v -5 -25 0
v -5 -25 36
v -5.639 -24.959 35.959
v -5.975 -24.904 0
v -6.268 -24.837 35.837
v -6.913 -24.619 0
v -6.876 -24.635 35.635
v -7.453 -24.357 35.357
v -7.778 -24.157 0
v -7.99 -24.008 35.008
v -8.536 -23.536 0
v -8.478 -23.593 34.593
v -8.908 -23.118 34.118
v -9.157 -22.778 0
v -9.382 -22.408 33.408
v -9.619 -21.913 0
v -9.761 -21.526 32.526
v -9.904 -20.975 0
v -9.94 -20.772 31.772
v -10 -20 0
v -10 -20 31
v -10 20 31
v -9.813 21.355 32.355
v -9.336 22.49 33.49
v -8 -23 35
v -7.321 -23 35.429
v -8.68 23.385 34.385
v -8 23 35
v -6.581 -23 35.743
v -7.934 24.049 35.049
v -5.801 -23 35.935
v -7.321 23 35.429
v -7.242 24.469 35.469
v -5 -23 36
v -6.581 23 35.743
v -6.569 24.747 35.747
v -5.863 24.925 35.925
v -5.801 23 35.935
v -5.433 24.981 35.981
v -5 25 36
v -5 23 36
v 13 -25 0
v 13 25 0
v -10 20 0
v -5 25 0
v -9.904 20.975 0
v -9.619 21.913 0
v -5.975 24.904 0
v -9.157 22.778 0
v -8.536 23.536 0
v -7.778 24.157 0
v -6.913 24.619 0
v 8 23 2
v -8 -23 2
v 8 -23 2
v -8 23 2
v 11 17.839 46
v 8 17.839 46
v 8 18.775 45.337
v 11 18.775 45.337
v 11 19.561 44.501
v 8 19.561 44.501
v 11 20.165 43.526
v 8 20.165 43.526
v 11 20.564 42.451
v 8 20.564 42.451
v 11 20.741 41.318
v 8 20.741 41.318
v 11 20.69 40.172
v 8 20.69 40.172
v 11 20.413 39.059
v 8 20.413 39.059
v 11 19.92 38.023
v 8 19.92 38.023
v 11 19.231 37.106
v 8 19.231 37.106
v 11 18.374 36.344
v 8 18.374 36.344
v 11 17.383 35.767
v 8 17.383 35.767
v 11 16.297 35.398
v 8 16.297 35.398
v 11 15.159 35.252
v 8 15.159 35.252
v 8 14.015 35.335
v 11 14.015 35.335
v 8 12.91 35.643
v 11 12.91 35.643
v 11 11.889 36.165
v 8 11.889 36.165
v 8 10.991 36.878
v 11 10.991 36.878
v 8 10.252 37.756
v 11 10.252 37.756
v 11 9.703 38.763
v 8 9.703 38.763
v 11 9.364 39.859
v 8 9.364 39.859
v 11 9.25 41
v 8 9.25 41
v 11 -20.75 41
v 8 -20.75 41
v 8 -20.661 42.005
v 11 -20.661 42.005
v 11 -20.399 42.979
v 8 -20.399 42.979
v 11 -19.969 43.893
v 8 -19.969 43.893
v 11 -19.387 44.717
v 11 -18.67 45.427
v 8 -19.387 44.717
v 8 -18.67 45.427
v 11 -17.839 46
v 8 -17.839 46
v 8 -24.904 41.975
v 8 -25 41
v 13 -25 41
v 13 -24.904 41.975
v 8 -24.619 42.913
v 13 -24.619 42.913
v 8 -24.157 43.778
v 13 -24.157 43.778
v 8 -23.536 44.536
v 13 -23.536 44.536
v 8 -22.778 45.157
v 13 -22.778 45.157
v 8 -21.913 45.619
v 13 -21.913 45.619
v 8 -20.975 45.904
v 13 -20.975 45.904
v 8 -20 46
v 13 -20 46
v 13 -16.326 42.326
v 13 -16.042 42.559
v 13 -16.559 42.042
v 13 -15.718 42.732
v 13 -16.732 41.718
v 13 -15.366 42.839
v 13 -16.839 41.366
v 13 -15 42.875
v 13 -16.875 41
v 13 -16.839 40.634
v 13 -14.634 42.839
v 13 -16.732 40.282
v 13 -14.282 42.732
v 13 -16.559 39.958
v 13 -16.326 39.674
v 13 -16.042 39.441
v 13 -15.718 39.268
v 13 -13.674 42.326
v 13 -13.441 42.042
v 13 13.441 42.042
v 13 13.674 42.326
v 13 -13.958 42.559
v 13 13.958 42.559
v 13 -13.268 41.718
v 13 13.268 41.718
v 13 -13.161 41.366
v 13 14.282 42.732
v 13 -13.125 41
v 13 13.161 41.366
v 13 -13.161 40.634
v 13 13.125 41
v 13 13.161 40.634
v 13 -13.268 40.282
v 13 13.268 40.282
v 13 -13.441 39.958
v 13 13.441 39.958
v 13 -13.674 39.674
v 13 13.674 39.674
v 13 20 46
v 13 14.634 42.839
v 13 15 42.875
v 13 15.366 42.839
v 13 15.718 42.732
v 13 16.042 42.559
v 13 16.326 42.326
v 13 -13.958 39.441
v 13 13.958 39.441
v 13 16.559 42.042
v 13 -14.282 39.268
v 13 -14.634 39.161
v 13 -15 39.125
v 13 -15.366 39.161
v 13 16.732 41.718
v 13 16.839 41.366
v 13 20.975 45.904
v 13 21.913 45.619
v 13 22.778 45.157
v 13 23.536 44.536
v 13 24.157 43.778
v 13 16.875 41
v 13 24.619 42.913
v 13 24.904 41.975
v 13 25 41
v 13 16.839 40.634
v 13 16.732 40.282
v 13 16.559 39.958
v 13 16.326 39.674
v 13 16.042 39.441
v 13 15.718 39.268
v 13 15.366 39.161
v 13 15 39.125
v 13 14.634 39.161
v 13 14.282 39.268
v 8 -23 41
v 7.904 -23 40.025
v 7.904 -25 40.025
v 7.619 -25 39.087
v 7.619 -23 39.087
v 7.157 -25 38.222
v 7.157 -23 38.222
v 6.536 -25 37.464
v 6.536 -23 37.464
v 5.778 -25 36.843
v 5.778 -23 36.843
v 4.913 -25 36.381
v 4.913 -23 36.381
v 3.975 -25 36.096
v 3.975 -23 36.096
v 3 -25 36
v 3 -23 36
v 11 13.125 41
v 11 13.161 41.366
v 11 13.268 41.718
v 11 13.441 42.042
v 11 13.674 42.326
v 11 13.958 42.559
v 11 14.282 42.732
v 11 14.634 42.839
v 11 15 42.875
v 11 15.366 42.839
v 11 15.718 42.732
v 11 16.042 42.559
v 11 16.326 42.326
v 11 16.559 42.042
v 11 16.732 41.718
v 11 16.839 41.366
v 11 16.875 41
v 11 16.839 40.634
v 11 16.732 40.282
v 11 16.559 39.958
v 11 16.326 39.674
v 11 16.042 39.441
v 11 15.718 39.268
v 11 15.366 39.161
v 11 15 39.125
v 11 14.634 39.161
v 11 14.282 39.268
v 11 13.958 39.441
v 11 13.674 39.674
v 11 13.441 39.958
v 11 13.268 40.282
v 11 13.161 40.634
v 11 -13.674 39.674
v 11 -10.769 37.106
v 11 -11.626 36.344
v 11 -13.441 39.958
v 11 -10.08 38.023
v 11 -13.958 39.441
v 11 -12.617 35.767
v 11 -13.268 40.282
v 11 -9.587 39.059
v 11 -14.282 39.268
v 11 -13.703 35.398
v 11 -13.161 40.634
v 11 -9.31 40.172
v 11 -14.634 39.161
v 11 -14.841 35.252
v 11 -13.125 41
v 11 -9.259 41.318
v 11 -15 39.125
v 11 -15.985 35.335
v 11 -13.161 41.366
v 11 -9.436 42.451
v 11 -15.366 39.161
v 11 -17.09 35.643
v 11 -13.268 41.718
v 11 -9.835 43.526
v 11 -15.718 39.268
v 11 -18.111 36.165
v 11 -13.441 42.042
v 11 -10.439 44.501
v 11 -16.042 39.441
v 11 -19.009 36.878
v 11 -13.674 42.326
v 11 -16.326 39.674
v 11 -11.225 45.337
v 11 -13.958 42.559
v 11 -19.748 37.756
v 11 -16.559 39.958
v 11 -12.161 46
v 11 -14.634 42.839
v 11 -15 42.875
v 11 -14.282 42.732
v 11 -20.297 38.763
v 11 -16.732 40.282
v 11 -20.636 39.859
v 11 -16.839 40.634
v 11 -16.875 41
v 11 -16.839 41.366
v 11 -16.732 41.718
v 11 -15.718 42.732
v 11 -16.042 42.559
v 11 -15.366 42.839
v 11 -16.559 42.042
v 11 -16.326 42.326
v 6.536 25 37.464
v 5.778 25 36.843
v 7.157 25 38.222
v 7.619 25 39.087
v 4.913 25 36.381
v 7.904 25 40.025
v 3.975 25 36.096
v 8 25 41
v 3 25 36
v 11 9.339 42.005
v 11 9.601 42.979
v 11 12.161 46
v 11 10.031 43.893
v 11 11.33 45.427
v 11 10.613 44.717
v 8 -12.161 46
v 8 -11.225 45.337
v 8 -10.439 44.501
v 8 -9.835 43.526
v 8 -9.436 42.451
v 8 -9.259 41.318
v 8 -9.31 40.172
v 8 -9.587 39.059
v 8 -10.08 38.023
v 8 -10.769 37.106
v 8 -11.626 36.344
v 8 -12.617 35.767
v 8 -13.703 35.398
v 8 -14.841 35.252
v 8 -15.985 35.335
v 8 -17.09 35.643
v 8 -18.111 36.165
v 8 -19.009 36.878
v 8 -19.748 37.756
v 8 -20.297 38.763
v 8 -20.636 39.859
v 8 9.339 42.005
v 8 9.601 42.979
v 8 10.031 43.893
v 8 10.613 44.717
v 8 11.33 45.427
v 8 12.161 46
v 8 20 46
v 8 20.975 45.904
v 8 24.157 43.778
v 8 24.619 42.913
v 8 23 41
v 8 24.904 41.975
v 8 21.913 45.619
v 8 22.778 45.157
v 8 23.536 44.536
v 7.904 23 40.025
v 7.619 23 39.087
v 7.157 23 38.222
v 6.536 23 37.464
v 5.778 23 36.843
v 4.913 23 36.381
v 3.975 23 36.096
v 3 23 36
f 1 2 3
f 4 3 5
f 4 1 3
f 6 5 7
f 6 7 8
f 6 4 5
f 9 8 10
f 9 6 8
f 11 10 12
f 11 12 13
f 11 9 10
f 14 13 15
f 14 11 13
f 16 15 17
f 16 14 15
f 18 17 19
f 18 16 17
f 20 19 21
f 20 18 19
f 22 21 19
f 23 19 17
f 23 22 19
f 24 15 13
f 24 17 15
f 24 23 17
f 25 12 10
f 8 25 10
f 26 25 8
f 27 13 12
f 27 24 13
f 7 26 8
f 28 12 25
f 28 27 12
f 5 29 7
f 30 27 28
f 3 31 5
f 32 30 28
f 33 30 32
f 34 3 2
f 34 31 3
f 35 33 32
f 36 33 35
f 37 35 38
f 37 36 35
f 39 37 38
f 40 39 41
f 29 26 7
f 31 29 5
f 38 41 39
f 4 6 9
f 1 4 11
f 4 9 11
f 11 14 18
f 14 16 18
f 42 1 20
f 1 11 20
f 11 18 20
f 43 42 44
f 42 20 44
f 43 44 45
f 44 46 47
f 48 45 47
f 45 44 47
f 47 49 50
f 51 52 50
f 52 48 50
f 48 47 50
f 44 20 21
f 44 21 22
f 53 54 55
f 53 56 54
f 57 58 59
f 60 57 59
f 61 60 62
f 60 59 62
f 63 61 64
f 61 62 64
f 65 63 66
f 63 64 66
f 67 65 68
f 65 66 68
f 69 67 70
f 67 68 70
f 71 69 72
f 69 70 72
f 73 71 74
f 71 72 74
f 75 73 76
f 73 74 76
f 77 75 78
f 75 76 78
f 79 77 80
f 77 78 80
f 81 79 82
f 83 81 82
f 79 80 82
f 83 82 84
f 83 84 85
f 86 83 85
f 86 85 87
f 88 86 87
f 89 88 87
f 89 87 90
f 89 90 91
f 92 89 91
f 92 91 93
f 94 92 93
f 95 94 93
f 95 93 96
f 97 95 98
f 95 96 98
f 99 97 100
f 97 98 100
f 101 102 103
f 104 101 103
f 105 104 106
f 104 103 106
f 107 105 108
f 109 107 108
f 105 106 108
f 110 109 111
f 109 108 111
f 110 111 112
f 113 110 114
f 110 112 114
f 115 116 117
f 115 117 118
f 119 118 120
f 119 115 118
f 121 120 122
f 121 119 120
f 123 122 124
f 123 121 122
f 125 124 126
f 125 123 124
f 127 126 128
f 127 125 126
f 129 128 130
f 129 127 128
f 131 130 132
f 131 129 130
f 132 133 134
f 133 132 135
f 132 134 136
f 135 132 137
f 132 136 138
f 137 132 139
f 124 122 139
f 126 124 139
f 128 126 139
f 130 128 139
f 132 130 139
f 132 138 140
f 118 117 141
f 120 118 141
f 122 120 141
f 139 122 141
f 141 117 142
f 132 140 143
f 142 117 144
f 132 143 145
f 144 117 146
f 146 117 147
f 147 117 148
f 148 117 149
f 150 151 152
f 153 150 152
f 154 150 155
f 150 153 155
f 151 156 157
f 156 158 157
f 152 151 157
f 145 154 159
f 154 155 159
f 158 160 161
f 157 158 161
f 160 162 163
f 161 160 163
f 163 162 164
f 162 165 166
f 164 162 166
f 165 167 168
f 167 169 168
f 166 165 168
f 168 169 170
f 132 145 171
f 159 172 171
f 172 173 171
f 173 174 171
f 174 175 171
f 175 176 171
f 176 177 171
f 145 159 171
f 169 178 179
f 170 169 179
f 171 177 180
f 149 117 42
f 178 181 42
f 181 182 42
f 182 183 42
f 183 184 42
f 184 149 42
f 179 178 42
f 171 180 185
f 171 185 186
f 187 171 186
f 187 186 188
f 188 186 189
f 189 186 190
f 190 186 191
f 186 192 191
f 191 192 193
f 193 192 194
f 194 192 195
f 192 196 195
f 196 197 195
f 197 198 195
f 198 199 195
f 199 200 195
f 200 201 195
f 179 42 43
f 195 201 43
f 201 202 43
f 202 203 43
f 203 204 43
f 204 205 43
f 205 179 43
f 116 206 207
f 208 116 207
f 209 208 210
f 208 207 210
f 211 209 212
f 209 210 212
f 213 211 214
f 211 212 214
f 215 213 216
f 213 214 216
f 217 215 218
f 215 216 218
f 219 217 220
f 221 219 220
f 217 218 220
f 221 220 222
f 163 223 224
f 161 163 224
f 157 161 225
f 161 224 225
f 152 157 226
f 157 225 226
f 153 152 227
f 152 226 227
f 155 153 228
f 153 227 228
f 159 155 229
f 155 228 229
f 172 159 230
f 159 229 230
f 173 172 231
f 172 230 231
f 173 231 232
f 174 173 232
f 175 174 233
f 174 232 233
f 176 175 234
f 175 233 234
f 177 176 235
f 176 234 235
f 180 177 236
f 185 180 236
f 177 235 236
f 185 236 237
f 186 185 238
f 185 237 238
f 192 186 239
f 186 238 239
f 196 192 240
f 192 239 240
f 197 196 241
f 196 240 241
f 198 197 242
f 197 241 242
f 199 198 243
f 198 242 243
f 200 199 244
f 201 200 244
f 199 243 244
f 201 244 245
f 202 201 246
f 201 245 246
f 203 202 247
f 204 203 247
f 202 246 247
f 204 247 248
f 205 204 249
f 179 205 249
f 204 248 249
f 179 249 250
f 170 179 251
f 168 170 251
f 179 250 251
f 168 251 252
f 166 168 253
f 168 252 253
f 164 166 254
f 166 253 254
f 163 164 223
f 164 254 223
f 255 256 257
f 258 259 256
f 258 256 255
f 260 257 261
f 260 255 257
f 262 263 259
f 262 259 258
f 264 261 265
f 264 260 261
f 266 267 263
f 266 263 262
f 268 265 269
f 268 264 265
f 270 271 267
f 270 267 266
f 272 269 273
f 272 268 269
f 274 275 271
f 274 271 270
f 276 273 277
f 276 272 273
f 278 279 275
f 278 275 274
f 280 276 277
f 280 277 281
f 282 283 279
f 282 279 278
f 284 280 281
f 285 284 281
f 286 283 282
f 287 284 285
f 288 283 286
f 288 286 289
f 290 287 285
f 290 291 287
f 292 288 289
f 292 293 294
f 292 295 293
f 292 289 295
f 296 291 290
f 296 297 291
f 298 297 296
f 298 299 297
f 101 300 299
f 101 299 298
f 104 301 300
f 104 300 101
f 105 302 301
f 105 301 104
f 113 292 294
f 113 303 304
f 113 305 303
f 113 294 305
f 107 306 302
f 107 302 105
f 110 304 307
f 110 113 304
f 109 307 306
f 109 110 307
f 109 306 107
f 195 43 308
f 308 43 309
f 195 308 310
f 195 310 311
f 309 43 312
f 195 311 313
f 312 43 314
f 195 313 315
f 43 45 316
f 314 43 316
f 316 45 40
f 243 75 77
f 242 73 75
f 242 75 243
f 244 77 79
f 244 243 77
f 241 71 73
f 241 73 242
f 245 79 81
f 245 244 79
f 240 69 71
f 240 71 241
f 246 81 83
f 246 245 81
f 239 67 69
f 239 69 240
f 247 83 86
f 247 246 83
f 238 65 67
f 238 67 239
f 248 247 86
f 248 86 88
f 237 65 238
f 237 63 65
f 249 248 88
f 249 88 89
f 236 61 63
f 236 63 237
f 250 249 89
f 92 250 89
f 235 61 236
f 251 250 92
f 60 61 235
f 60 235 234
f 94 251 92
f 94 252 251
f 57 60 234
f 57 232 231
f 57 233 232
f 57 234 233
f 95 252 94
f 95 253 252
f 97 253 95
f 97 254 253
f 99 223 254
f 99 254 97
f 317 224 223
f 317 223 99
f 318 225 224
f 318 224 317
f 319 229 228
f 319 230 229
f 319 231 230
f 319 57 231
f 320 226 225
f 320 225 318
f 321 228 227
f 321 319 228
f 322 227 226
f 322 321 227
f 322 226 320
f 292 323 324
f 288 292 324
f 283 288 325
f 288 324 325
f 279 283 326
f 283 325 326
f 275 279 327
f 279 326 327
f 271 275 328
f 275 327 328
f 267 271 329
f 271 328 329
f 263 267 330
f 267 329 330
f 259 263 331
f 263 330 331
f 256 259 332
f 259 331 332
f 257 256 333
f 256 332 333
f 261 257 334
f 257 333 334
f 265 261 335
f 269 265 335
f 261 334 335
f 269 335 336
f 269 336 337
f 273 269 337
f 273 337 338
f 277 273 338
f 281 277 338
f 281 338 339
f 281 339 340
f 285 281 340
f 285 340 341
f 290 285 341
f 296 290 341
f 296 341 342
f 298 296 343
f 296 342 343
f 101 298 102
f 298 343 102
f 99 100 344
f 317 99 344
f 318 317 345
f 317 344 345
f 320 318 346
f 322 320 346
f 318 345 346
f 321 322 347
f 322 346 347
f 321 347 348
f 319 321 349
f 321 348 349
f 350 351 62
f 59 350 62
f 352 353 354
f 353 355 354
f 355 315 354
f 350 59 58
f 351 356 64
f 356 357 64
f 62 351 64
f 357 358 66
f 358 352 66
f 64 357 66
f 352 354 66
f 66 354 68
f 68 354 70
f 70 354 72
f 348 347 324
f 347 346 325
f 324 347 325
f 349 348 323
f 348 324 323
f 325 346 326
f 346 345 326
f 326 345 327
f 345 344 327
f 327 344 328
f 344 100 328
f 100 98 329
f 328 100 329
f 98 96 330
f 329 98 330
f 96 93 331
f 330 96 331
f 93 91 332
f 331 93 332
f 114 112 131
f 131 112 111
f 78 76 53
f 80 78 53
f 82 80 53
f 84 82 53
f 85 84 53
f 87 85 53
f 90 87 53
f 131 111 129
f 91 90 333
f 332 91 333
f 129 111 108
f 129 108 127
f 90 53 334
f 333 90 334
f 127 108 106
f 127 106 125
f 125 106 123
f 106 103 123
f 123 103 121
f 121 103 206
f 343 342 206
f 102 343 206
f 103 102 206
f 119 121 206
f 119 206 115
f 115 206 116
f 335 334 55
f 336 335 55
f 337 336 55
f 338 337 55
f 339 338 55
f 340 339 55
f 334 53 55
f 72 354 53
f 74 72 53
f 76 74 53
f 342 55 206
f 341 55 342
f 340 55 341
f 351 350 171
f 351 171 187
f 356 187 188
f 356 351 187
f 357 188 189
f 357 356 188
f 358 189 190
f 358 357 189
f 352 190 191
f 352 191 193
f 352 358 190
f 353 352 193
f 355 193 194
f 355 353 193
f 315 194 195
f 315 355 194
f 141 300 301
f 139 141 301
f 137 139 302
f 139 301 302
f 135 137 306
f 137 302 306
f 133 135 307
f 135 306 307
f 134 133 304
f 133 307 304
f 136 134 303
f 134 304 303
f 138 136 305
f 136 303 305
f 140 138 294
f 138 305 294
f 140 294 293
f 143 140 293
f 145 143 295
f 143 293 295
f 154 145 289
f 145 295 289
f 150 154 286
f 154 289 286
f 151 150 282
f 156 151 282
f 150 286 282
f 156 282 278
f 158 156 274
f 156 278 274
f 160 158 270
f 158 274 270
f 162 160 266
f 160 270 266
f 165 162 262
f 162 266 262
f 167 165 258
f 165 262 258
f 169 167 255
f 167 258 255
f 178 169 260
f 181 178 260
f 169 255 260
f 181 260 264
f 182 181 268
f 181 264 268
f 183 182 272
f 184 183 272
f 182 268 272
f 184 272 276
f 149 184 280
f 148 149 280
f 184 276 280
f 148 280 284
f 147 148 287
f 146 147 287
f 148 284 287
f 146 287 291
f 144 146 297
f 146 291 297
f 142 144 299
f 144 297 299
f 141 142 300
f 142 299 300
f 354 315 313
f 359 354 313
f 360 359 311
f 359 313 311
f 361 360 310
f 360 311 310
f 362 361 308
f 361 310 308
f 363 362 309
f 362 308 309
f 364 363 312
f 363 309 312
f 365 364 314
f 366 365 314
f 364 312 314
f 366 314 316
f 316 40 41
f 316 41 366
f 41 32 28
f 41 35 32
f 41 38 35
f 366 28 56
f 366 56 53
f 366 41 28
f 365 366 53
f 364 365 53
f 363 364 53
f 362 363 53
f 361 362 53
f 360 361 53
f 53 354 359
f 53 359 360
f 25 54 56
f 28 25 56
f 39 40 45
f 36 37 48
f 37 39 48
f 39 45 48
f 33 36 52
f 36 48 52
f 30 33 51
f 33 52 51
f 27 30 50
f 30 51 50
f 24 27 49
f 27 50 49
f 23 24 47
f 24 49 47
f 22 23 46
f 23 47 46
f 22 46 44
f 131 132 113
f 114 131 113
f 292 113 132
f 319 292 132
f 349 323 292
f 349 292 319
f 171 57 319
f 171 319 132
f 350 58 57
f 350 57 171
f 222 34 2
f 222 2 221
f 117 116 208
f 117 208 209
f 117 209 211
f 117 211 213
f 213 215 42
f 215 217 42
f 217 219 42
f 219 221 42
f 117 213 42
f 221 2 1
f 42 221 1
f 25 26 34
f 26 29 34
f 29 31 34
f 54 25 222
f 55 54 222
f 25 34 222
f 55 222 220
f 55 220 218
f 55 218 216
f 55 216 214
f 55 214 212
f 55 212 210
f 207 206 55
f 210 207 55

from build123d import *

# Parameters (mm, degrees)
F0_W        = 20
F0_H        = 50
F0_W_2      = 16
F0_H_2      = 46
F1_DEPTH    = 2
F2_DEPTH    = 36
F4_DEPTH    = 10
F5_R        = 1.875
F6_DEPTH    = 25
F7_T1_DEPTH = 2
F7_T3_DEPTH = 2
F7_T5_DEPTH = 61
F7_T7_DEPTH = 27
F7_T9_DEPTH = 75
F8_DEPTH    = 3
F9_DEPTH    = 3


# Not quite as in the source:
# - a fillet or chamfer that OpenCascade refuses, or shapes differently, is made with other operations: its cross-section is extruded or revolved along the edge and cut away or added


with BuildPart() as f1:
    # F0 (on Top) → F1 (new body)
    with BuildSketch(Plane.XY):
        Rectangle(F0_W, F0_H)
        Rectangle(F0_W_2, F0_H_2, mode=Mode.SUBTRACT)
        Rectangle(F0_W_2, F0_H_2)
    extrude(amount=F1_DEPTH)

    # F0 (on Top) → F2 (join)
    with BuildSketch(Plane.XY):
        Rectangle(F0_W, F0_H)
        Rectangle(F0_W_2, F0_H_2, mode=Mode.SUBTRACT)
    extrude(amount=F2_DEPTH)

    # F3 (on face) → F4 (join)
    with BuildSketch(Plane.XY.offset(36)):
        Polygon((10, -25), (10, 25), (8, 25), (8, 23), (8, -23), (8, -25), align=None)
    extrude(amount=F4_DEPTH)

    # F5 (on face) → F6 (cut)
    with BuildSketch(Plane(origin=(8, 0, 0), x_dir=(0, -1, 0), z_dir=(-1, 0, 0))):
        with Locations((15, 41)):
            Circle(F5_R)
        with Locations((-15, 41)):
            Circle(F5_R)
    extrude(amount=-F6_DEPTH, mode=Mode.SUBTRACT)

    # F7: fillet of radius 5 on 7 edges, made by hand

    # F7_s2 → F7_t1 (join)
    with BuildSketch(Plane.XZ.offset(23)):
        with BuildLine():
            ThreePointArc((8, 41), (6.5355339059, 37.4644660941), (3, 36))
            Line((3, 36), (8, 36))
            Line((8, 36), (8, 41))
        make_face()
    extrude(amount=F7_T1_DEPTH)

    # F7_s4 → F7_t3 (join)
    with BuildSketch(Plane.XZ.offset(-25)):
        with BuildLine():
            ThreePointArc((8, 41), (6.5355339059, 37.4644660941), (3, 36))
            Line((3, 36), (8, 36))
            Line((8, 36), (8, 41))
        make_face()
    extrude(amount=F7_T3_DEPTH)

    # F7_s6 → F7_t5 (cut)
    with BuildSketch(Plane.XY.offset(-12.5)):
        with BuildLine():
            ThreePointArc((-5, -25), (-8.5355339059, -23.5355339059), (-10, -20))
            Line((-10, -20), (-10, -25))
            Line((-10, -25), (-5, -25))
        make_face()
        with BuildLine():
            ThreePointArc((-5, 25), (-8.5355339059, 23.5355339059), (-10, 20))
            Line((-10, 20), (-10, 25))
            Line((-10, 25), (-5, 25))
        make_face()
    extrude(amount=F7_T5_DEPTH, mode=Mode.SUBTRACT)

    # F7_s8 → F7_t7 (cut)
    with BuildSketch(Plane.YZ.offset(-4.5)):
        with BuildLine():
            ThreePointArc((-25, 41), (-23.5355339059, 44.5355339059), (-20, 46))
            Line((-20, 46), (-25, 46))
            Line((-25, 46), (-25, 41))
        make_face()
        with BuildLine():
            ThreePointArc((25, 41), (23.5355339059, 44.5355339059), (20, 46))
            Line((20, 46), (25, 46))
            Line((25, 46), (25, 41))
        make_face()
    extrude(amount=F7_T7_DEPTH, mode=Mode.SUBTRACT)

    # F7_s10 → F7_t9 (cut)
    with BuildSketch(Plane.XZ.offset(-37.5)):
        with BuildLine():
            ThreePointArc((-10, 31), (-8.5355339059, 34.5355339059), (-5, 36))
            Line((-5, 36), (-10, 36))
            Line((-10, 36), (-10, 31))
        make_face()
    extrude(amount=F7_T9_DEPTH, mode=Mode.SUBTRACT)

    # F8 (add): a face of the model
    f8_faces = [f1.faces().sort_by_distance(p)[0] for p in [
        (10, 0, 22.721056124),
    ]]
    extrude(f8_faces, amount=F8_DEPTH)

    # F5 (on face) → F9 (cut)
    with BuildSketch(Plane(origin=(8, 0, 0), x_dir=(0, -1, 0), z_dir=(-1, 0, 0))):
        with BuildLine():
            ThreePointArc((-9.25, 41), (-10.0306257188, 43.8927183155), (-12.1605458271, 46))
            Line((-12.1605458271, 46), (-17.8394541729, 46))
            ThreePointArc((-17.8394541729, 46), (-17.8927183155, 36.0306257188), (-9.25, 41))
        make_face()
        with Locations((-15, 41)):
            Circle(F5_R, mode=Mode.SUBTRACT)
        with BuildLine():
            ThreePointArc((12.1605458271, 46), (12.1072816845, 36.0306257188), (20.75, 41))
            ThreePointArc((20.75, 41), (19.9693742812, 43.8927183155), (17.8394541729, 46))
            Line((17.8394541729, 46), (12.1605458271, 46))
        make_face()
        with Locations((15, 41)):
            Circle(F5_R, mode=Mode.SUBTRACT)
    extrude(amount=-F9_DEPTH, mode=Mode.SUBTRACT)


solid = f1.part
